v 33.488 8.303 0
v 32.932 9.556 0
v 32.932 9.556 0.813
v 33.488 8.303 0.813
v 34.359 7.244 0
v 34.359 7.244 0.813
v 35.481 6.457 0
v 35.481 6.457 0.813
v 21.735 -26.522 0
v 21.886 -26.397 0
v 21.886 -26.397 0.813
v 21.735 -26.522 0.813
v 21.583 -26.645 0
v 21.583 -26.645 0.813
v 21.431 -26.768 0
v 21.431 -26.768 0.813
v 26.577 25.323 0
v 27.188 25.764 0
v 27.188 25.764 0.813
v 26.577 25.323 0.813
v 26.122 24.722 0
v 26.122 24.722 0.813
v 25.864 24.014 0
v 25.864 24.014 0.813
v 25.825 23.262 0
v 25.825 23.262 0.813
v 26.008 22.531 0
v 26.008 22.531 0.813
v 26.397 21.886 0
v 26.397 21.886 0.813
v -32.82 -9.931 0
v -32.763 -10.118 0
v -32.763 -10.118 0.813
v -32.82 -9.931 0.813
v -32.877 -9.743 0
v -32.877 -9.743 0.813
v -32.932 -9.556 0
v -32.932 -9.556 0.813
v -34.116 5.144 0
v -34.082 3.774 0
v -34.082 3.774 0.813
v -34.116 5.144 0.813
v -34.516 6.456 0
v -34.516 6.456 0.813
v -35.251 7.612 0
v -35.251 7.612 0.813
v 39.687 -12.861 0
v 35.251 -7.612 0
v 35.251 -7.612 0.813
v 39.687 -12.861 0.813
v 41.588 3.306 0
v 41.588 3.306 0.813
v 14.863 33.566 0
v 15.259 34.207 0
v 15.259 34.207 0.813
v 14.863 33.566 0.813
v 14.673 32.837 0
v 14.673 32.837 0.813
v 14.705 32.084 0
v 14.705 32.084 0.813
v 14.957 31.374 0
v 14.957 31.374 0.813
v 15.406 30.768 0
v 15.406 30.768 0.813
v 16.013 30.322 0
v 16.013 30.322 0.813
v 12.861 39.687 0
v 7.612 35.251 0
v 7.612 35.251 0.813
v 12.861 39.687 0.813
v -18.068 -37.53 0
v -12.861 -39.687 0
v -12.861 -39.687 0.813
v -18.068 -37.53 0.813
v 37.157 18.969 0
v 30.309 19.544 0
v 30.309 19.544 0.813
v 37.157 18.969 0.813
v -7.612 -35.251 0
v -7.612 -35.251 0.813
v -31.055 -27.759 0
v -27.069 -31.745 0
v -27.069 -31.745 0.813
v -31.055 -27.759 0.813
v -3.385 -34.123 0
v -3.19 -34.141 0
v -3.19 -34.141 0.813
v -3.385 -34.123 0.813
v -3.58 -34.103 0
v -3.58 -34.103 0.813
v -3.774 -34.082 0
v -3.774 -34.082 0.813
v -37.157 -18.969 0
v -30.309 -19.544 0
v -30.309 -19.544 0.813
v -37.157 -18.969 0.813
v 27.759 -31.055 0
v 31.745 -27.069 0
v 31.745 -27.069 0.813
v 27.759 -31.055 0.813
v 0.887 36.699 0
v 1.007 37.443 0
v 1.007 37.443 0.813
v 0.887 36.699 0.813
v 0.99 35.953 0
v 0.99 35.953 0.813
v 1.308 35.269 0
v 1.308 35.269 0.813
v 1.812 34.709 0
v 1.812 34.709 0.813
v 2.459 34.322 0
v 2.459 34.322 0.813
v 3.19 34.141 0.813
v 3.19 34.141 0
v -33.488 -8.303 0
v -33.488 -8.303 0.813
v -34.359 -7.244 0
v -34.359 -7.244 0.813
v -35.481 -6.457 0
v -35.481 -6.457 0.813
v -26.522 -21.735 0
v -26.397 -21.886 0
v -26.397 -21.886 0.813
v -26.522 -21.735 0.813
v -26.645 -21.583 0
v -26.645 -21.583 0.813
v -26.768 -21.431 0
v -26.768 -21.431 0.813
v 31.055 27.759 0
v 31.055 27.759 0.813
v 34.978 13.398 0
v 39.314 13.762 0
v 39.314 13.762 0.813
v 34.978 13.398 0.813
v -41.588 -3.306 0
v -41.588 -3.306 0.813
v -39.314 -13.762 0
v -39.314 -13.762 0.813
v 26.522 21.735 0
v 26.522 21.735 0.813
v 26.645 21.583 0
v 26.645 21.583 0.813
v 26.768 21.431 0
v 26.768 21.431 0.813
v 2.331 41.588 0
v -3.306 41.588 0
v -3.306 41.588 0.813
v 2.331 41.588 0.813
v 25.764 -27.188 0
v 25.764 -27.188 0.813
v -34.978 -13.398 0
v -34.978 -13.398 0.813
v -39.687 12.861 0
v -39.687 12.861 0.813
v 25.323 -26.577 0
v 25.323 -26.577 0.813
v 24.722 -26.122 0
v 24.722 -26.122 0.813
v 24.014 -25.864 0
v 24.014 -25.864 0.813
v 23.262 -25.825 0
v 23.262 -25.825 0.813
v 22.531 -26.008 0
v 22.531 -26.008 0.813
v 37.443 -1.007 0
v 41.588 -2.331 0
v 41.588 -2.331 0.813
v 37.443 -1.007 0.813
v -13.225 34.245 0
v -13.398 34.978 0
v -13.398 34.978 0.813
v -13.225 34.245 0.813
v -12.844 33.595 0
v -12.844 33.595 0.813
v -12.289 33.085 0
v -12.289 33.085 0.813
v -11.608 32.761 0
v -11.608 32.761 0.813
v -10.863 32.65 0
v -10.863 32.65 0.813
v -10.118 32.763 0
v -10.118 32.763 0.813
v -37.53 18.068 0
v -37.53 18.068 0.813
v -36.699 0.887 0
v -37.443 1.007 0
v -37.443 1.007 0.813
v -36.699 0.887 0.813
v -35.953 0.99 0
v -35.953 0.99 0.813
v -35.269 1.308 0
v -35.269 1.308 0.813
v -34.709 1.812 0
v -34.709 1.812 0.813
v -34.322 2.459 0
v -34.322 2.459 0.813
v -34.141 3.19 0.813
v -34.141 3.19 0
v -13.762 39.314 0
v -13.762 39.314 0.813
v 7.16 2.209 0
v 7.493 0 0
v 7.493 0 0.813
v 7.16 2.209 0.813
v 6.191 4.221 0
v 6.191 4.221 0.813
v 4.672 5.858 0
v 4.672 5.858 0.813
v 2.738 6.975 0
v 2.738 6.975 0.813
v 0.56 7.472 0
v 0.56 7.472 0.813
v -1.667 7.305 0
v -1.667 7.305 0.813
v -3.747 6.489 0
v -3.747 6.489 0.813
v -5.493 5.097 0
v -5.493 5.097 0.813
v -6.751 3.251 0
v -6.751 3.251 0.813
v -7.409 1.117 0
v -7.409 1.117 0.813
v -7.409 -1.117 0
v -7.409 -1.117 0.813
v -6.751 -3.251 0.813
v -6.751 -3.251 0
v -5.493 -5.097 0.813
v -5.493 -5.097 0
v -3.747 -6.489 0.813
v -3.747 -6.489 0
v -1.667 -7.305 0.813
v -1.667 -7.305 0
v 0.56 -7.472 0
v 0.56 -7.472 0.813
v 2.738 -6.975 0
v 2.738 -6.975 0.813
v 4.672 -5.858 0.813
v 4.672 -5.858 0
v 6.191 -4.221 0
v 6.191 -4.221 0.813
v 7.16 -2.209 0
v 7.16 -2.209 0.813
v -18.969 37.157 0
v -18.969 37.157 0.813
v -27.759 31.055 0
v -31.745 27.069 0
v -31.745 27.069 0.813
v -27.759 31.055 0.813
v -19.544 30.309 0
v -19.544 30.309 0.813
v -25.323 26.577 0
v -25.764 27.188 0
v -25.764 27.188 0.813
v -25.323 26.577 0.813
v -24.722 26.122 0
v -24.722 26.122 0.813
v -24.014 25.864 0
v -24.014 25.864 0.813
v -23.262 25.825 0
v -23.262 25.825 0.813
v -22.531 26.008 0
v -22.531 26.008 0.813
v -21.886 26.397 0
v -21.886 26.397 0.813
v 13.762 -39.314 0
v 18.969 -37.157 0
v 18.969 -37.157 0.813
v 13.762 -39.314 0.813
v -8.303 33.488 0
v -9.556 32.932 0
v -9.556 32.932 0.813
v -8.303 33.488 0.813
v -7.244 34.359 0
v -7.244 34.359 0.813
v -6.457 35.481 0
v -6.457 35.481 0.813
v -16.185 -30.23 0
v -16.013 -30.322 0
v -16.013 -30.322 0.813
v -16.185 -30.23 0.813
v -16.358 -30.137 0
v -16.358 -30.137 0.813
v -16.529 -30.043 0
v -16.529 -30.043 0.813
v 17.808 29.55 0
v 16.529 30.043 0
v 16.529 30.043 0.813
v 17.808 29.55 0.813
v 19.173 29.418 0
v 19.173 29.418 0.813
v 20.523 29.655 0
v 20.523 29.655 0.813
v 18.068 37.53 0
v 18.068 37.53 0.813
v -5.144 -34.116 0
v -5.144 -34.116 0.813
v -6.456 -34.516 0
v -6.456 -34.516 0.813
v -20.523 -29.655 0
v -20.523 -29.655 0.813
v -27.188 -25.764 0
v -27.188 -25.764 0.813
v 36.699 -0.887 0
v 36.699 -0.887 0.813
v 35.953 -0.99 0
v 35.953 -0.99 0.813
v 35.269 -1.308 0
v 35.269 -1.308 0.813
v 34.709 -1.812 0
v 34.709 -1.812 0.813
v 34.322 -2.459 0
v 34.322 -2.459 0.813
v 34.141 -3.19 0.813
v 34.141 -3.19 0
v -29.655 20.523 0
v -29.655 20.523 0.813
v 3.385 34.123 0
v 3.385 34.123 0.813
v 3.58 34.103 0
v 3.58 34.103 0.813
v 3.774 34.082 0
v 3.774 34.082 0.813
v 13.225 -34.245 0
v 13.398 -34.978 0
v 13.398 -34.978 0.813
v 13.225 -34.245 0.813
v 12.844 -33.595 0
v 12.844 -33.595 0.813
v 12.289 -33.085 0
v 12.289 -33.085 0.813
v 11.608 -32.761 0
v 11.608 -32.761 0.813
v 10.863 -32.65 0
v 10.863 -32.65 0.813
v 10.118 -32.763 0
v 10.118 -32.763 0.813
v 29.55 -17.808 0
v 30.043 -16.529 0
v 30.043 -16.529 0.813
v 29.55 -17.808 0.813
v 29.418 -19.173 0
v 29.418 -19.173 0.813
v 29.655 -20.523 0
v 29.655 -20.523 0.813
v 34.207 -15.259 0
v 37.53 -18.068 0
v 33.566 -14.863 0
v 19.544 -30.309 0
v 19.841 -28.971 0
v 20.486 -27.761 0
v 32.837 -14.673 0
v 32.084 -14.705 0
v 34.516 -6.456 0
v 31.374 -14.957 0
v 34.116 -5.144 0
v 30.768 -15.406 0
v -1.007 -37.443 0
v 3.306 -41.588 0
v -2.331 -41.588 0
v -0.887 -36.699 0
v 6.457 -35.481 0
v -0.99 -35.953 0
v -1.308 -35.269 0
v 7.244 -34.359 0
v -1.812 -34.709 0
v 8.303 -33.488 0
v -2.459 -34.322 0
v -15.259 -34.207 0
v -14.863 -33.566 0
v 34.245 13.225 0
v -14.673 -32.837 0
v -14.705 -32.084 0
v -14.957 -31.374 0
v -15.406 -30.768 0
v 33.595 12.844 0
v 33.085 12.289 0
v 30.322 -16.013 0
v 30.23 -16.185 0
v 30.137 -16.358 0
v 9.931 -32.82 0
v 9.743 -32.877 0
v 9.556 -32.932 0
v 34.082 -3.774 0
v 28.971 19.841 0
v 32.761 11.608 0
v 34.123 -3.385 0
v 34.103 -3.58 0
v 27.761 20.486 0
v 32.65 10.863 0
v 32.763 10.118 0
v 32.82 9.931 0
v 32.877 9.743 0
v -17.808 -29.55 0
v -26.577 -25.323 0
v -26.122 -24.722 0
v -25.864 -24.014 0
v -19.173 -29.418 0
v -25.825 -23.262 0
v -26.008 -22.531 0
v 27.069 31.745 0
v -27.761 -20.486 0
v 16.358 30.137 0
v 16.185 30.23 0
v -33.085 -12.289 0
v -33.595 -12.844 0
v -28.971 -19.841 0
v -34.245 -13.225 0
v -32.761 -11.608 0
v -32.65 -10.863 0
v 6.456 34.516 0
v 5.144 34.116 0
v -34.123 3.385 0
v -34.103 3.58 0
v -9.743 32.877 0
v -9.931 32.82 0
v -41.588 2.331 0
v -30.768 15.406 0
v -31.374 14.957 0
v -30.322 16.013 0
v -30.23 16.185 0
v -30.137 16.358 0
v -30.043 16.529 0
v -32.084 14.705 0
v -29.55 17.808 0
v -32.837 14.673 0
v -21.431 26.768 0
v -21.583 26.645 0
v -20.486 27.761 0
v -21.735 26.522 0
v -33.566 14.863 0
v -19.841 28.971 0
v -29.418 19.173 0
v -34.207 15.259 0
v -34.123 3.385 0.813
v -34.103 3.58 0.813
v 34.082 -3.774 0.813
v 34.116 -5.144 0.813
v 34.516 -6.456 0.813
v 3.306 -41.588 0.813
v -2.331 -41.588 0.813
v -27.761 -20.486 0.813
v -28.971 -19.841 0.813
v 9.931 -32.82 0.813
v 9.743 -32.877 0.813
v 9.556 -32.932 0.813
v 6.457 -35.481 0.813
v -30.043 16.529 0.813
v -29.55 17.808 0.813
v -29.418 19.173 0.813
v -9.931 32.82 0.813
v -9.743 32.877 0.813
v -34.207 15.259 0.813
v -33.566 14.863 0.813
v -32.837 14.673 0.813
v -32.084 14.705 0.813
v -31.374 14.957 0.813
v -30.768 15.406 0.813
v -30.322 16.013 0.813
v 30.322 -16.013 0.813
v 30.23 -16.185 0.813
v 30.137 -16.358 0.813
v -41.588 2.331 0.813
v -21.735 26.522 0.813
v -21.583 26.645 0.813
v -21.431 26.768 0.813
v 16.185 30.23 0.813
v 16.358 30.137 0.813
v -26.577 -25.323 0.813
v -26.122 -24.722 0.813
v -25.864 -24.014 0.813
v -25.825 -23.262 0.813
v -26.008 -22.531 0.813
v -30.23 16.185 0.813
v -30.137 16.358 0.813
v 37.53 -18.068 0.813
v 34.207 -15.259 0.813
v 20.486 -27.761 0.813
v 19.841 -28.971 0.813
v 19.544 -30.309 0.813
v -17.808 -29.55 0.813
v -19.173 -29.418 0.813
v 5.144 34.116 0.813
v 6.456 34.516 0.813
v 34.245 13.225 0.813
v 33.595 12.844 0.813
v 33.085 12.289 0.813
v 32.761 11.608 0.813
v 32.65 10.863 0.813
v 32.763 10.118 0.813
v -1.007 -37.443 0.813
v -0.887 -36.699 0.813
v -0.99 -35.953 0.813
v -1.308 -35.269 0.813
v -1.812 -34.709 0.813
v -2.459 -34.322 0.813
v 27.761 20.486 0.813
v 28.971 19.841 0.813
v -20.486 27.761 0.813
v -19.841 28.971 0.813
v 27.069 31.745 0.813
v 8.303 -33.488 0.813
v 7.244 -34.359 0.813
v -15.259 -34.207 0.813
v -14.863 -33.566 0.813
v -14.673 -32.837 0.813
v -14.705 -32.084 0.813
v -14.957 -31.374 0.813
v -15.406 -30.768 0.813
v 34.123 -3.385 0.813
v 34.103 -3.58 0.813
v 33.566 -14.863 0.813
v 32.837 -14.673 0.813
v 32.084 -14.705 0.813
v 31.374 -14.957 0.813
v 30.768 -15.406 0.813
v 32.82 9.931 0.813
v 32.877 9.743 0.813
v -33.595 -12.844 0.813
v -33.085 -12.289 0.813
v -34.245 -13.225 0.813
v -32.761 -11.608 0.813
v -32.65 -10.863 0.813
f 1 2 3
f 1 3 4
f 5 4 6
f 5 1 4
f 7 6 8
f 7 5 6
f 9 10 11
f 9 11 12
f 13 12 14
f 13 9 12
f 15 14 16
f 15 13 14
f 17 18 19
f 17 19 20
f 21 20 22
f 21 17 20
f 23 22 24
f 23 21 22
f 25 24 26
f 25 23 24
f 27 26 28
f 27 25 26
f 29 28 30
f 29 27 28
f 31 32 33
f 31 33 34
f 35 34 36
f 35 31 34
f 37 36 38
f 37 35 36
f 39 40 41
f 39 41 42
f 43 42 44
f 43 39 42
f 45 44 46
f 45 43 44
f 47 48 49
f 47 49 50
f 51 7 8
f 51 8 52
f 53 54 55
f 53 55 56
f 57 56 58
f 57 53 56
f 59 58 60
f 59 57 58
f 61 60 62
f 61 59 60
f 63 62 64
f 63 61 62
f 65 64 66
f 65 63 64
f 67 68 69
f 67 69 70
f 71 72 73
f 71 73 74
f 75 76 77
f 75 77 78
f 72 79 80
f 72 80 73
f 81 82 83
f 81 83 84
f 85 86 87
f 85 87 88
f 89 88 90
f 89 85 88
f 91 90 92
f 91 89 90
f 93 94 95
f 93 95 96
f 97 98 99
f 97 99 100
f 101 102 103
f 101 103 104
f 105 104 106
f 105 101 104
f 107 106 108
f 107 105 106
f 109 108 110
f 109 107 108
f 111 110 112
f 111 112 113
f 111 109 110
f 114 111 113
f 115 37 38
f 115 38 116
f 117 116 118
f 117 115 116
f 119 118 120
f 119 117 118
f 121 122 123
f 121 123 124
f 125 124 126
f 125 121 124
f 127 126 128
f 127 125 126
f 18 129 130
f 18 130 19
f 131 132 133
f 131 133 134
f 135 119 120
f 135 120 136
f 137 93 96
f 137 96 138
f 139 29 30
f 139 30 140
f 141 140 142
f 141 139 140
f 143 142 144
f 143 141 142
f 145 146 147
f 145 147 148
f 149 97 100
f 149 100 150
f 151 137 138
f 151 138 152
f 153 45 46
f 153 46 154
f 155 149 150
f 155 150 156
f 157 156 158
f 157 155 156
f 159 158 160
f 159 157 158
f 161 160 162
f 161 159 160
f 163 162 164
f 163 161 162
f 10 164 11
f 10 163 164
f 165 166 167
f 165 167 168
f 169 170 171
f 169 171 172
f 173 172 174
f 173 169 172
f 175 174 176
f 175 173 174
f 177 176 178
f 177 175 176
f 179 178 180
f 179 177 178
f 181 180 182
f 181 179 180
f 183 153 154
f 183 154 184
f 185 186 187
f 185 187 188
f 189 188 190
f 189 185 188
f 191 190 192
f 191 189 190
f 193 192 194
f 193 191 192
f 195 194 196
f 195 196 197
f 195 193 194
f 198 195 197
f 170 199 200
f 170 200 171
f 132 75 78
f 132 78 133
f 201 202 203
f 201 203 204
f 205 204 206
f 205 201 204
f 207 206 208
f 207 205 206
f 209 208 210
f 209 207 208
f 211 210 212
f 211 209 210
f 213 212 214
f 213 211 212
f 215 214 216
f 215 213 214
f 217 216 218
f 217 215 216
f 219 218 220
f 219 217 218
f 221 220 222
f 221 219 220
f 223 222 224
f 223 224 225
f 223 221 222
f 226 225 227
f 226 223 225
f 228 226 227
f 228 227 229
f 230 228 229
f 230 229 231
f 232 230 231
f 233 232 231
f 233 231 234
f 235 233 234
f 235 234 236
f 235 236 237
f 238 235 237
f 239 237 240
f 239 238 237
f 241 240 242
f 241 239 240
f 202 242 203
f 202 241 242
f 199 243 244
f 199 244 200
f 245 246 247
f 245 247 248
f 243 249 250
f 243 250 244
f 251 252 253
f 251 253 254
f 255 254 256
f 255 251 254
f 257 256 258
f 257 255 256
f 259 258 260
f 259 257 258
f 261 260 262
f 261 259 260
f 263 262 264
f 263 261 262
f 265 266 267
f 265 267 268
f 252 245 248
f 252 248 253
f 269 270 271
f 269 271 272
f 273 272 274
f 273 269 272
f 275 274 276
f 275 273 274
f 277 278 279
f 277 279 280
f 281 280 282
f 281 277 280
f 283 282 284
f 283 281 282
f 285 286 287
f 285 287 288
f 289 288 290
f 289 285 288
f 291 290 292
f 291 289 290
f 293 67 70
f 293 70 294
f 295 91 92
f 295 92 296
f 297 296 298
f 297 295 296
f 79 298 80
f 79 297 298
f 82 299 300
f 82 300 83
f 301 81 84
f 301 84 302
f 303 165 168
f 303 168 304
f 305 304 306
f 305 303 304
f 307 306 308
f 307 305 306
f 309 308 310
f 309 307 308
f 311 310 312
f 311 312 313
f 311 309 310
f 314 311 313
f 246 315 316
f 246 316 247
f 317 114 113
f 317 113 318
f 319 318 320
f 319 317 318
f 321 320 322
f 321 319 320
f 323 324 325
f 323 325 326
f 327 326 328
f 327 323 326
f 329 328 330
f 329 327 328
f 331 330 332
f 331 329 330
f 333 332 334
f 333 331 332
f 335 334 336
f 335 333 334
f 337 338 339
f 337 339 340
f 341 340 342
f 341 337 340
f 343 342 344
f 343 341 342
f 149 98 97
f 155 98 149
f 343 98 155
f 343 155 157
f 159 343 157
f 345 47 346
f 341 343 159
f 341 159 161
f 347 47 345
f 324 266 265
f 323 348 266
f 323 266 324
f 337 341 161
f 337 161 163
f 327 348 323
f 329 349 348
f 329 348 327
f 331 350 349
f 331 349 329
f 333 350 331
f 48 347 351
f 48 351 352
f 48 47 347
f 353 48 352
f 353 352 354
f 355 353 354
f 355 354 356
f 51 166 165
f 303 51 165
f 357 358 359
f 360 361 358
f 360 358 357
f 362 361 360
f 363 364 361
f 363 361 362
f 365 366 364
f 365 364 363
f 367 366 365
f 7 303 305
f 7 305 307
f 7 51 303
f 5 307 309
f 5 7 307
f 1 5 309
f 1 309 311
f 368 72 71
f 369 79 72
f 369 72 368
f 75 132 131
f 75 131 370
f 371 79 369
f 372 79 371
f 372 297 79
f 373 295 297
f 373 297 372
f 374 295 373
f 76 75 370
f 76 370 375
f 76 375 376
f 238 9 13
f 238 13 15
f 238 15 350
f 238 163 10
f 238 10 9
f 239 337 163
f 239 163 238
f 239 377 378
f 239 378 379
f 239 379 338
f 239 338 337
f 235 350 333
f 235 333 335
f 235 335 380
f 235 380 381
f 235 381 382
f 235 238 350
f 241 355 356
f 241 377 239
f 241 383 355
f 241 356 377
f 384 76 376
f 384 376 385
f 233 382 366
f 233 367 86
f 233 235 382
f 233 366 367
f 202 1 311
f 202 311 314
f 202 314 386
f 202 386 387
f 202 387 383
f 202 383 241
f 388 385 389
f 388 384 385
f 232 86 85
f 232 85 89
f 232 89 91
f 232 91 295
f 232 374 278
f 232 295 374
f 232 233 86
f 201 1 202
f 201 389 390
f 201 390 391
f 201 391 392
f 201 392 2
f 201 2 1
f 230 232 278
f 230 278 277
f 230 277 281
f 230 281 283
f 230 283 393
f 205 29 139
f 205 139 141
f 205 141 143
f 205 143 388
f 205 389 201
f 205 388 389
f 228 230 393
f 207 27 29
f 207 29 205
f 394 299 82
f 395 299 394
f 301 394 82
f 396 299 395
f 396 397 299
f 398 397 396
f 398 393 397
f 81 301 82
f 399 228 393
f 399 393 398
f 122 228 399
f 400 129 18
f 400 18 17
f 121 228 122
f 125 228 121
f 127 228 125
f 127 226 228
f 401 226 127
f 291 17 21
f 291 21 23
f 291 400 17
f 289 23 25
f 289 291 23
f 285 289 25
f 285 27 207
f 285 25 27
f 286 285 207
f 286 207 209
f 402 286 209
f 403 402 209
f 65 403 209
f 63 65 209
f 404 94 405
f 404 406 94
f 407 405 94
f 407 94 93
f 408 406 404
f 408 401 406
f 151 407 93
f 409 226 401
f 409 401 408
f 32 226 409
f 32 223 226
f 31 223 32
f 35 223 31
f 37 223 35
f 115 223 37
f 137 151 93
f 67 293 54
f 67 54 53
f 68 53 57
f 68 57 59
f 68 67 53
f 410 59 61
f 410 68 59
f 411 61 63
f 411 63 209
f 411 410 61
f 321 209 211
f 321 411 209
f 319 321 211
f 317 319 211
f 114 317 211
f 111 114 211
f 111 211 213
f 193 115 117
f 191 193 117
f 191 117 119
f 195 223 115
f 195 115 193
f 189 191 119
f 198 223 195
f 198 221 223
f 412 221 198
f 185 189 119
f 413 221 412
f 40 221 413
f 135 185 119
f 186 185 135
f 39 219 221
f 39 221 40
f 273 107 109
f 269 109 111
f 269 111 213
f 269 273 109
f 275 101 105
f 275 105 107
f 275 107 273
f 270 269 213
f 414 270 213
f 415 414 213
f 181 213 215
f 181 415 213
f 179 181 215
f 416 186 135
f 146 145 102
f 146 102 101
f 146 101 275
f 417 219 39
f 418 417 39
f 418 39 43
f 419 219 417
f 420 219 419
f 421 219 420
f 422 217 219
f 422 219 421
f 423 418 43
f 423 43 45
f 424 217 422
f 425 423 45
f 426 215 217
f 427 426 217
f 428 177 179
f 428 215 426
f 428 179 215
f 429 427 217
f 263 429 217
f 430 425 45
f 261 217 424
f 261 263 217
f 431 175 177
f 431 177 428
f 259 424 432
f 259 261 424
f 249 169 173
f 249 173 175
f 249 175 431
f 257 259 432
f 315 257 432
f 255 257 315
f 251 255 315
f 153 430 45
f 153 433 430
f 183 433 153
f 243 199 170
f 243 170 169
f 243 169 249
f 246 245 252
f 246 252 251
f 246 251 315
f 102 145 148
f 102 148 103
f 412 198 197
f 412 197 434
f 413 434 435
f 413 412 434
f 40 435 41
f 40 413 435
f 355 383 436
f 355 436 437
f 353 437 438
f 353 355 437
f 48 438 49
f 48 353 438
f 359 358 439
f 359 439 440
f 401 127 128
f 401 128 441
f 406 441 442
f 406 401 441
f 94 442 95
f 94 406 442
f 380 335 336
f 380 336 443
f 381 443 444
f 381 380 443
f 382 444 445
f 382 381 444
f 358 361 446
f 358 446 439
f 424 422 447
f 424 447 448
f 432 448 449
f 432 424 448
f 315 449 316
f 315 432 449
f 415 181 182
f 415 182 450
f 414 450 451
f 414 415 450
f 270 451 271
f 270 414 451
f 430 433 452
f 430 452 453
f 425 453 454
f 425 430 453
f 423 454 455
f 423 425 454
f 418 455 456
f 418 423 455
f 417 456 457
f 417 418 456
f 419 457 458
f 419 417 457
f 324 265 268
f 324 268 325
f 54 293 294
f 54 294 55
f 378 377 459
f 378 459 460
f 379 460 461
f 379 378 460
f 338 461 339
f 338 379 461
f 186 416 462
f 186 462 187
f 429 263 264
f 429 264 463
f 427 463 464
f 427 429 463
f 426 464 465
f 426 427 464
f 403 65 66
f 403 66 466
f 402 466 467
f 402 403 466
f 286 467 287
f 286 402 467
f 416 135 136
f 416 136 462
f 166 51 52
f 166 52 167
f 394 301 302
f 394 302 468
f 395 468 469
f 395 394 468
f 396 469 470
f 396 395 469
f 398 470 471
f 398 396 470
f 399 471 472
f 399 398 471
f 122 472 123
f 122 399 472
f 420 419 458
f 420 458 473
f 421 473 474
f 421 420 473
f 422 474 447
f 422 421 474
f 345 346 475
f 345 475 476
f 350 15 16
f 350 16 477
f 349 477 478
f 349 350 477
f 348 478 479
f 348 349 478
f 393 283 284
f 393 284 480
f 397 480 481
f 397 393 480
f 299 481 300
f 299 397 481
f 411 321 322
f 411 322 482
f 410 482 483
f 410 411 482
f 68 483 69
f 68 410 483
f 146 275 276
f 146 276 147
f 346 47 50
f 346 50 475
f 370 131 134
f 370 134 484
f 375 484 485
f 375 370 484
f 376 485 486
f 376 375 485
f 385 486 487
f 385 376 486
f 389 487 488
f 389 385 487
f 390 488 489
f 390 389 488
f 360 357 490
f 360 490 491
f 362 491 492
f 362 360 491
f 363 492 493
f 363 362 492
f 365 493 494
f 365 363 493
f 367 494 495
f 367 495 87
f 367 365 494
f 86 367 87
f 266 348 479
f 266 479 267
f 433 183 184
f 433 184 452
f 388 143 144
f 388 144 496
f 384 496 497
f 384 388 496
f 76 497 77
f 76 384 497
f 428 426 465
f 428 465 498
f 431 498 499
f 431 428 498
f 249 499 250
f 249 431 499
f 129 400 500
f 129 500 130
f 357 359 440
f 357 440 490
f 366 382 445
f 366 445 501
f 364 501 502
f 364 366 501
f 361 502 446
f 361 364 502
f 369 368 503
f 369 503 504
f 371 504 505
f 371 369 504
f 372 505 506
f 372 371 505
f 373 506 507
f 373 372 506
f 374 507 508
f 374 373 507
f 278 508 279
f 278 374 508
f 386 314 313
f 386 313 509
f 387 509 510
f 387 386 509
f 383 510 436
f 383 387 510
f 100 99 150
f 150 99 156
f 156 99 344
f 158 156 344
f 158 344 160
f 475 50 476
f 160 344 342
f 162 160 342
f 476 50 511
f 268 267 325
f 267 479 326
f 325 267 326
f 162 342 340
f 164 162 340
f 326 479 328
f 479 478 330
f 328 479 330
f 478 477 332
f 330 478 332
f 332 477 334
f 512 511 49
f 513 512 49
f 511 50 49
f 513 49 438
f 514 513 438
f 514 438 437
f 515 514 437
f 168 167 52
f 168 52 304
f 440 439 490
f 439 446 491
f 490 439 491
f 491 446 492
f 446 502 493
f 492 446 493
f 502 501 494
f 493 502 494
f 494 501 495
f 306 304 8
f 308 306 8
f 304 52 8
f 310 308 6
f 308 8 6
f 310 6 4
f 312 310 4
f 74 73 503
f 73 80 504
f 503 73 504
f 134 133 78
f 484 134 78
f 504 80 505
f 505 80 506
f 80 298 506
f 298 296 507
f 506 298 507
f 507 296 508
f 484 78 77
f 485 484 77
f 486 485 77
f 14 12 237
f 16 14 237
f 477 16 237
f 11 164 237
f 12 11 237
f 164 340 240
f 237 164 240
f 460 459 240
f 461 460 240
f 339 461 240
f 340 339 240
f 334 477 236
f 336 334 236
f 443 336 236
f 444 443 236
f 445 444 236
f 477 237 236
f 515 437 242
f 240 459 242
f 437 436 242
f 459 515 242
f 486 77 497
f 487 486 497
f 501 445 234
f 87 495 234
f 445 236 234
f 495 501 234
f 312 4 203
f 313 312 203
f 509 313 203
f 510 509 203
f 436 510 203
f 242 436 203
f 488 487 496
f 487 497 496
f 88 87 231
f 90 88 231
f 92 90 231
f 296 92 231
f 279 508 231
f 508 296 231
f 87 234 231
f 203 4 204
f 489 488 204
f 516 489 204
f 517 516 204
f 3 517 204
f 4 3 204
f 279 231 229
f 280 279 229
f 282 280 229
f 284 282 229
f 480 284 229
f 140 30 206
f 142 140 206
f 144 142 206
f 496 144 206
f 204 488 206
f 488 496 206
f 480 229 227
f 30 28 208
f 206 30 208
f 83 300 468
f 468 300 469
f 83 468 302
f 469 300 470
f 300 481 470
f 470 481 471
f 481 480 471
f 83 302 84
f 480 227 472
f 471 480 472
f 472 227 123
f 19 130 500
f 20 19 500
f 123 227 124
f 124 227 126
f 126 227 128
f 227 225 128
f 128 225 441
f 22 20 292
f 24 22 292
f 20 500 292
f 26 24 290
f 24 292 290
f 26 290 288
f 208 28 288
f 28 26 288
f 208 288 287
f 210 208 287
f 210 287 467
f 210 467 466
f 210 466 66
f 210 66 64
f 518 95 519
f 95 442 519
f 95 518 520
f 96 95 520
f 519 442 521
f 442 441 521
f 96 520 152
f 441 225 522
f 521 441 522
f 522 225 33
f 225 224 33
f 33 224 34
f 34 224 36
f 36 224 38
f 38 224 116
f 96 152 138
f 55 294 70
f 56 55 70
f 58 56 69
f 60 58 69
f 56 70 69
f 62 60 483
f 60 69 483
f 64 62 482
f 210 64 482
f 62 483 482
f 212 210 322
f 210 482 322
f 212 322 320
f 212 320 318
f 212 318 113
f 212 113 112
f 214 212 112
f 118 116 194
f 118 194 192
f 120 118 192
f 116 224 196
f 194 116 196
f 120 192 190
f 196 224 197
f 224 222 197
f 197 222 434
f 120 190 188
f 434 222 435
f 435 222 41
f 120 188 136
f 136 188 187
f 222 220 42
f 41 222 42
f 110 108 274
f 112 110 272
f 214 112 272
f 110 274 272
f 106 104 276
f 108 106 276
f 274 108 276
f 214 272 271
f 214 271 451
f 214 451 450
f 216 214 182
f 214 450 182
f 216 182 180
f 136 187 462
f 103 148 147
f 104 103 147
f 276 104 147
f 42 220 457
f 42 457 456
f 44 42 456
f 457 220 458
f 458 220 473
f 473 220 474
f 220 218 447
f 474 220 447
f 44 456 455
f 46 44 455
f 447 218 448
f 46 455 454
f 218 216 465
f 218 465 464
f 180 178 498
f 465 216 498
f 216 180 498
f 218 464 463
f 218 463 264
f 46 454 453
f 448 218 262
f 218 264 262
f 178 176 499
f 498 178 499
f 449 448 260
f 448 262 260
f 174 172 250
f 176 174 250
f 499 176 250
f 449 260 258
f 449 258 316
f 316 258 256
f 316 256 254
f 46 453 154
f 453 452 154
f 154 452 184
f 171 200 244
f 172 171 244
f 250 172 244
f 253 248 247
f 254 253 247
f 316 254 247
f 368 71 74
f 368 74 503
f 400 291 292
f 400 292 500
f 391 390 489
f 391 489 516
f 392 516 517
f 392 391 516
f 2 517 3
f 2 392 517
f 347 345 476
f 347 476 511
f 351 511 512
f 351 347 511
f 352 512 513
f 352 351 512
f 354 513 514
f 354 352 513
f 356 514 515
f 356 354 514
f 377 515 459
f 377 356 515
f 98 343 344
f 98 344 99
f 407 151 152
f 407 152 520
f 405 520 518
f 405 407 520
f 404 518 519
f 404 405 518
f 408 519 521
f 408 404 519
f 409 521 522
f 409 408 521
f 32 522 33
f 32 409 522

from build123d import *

# Parameters (mm, degrees)
SKETCH1_R           = 7.493
BOSS_EXTRUDE1_DEPTH = 0.8128


with BuildPart() as part:
    # Sketch1 → Boss-Extrude1 (new body)
    with BuildSketch(Plane.XY):
        with BuildLine():
            Line((-6.457079781, 35.480882848), (-3.305892697, 41.587736724))
            Line((-3.305892697, 41.587736724), (2.330830076, 41.587736724))
            Line((2.330830076, 41.587736724), (1.007052256, 37.443040758))
            ThreePointArc((1.007052256, 37.443040758), (1.307937447, 35.269279401), (3.190317281, 34.141264998))
            ThreePointArc((3.190317281, 34.141264998), (3.482262993, 34.112724084), (3.773953868, 34.081686757))
            ThreePointArc((3.773953868, 34.081686757), (5.813520367, 34.271336714), (7.612382182, 35.251078913))
            Line((7.612382182, 35.251078913), (12.860691234, 39.687169127))
            Line((12.860691234, 39.687169127), (18.068344035, 37.530088709))
            Line((18.068344035, 37.530088709), (15.259226323, 34.207476777))
            ThreePointArc((15.259226323, 34.207476777), (14.705345535, 32.084039374), (16.012765313, 30.321534378))
            ThreePointArc((16.012765313, 30.321534378), (16.271565846, 30.183443225), (16.529175604, 30.043143208))
            ThreePointArc((16.529175604, 30.043143208), (18.486065244, 29.437848614), (20.522927965, 29.654617765))
            Line((20.522927965, 29.654617765), (27.069351508, 31.744589796))
            Line((27.069351508, 31.744589796), (31.055116405, 27.758824899))
            Line((31.055116405, 27.758824899), (27.188321507, 25.764134549))
            ThreePointArc((27.188321507, 25.764134549), (25.86399807, 24.014295194), (26.397414982, 21.885625015))
            ThreePointArc((26.397414982, 21.885625015), (26.583670301, 21.659006749), (26.767980192, 21.430803448))
            ThreePointArc((26.767980192, 21.430803448), (28.344274264, 20.122714917), (30.309044005, 19.543509881))
            Line((30.309044005, 19.543509881), (37.156948399, 18.969184434))
            Line((37.156948399, 18.969184434), (39.314028817, 13.761531633))
            Line((39.314028817, 13.761531633), (34.978241205, 13.398436388))
            ThreePointArc((34.978241205, 13.398436388), (33.085091357, 12.288592261), (32.763297513, 10.117827636))
            ThreePointArc((32.763297513, 10.117827636), (32.848651934, 9.837182834), (32.931602448, 9.555818134))
            ThreePointArc((32.931602448, 9.555818134), (33.88732447, 7.744080287), (35.480882848, 6.457079781))
            Line((35.480882848, 6.457079781), (41.587736724, 3.305892697))
            Line((41.587736724, 3.305892697), (41.587736724, -2.330830076))
            Line((41.587736724, -2.330830076), (37.443040758, -1.007052256))
            ThreePointArc((37.443040758, -1.007052256), (35.269279401, -1.307937447), (34.141264998, -3.190317281))
            ThreePointArc((34.141264998, -3.190317281), (34.112724084, -3.482262993), (34.081686757, -3.773953868))
            ThreePointArc((34.081686757, -3.773953868), (34.271336714, -5.813520367), (35.251078913, -7.612382182))
            Line((35.251078913, -7.612382182), (39.687169127, -12.860691234))
            Line((39.687169127, -12.860691234), (37.530088709, -18.068344035))
            Line((37.530088709, -18.068344035), (34.207476777, -15.259226323))
            ThreePointArc((34.207476777, -15.259226323), (32.084039374, -14.705345535), (30.321534378, -16.012765313))
            ThreePointArc((30.321534378, -16.012765313), (30.183443225, -16.271565846), (30.043143208, -16.529175604))
            ThreePointArc((30.043143208, -16.529175604), (29.437848614, -18.486065244), (29.654617765, -20.522927965))
            Line((29.654617765, -20.522927965), (31.744589796, -27.069351508))
            Line((31.744589796, -27.069351508), (27.758824899, -31.055116405))
            Line((27.758824899, -31.055116405), (25.764134549, -27.188321507))
            ThreePointArc((25.764134549, -27.188321507), (24.014295194, -25.86399807), (21.885625015, -26.397414982))
            ThreePointArc((21.885625015, -26.397414982), (21.659006749, -26.583670301), (21.430803448, -26.767980192))
            ThreePointArc((21.430803448, -26.767980192), (20.122714917, -28.344274264), (19.543509881, -30.309044005))
            Line((19.543509881, -30.309044005), (18.969184434, -37.156948399))
            Line((18.969184434, -37.156948399), (13.761531633, -39.314028817))
            Line((13.761531633, -39.314028817), (13.398436388, -34.978241205))
            ThreePointArc((13.398436388, -34.978241205), (12.288592261, -33.085091357), (10.117827636, -32.763297513))
            ThreePointArc((10.117827636, -32.763297513), (9.837182834, -32.848651934), (9.555818134, -32.931602448))
            ThreePointArc((9.555818134, -32.931602448), (7.744080287, -33.88732447), (6.457079781, -35.480882848))
            Line((6.457079781, -35.480882848), (3.305892697, -41.587736724))
            Line((3.305892697, -41.587736724), (-2.330830076, -41.587736724))
            Line((-2.330830076, -41.587736724), (-1.007052256, -37.443040758))
            ThreePointArc((-1.007052256, -37.443040758), (-1.307937447, -35.269279401), (-3.190317281, -34.141264998))
            ThreePointArc((-3.190317281, -34.141264998), (-3.482262993, -34.112724084), (-3.773953868, -34.081686757))
            ThreePointArc((-3.773953868, -34.081686757), (-5.813520367, -34.271336714), (-7.612382182, -35.251078913))
            Line((-7.612382182, -35.251078913), (-12.860691234, -39.687169127))
            Line((-12.860691234, -39.687169127), (-18.068344035, -37.530088709))
            Line((-18.068344035, -37.530088709), (-15.259226323, -34.207476777))
            ThreePointArc((-15.259226323, -34.207476777), (-14.705345535, -32.084039374), (-16.012765313, -30.321534378))
            ThreePointArc((-16.012765313, -30.321534378), (-16.271565846, -30.183443225), (-16.529175604, -30.043143208))
            ThreePointArc((-16.529175604, -30.043143208), (-18.486065244, -29.437848614), (-20.522927965, -29.654617765))
            Line((-20.522927965, -29.654617765), (-27.069351508, -31.744589796))
            Line((-27.069351508, -31.744589796), (-31.055116405, -27.758824899))
            Line((-31.055116405, -27.758824899), (-27.188321507, -25.764134549))
            ThreePointArc((-27.188321507, -25.764134549), (-25.86399807, -24.014295194), (-26.397414982, -21.885625015))
            ThreePointArc((-26.397414982, -21.885625015), (-26.583670301, -21.659006749), (-26.767980192, -21.430803448))
            ThreePointArc((-26.767980192, -21.430803448), (-28.344274264, -20.122714917), (-30.309044005, -19.543509881))
            Line((-30.309044005, -19.543509881), (-37.156948399, -18.969184434))
            Line((-37.156948399, -18.969184434), (-39.314028817, -13.761531633))
            Line((-39.314028817, -13.761531633), (-34.978241205, -13.398436388))
            ThreePointArc((-34.978241205, -13.398436388), (-33.085091357, -12.288592261), (-32.763297513, -10.117827636))
            ThreePointArc((-32.763297513, -10.117827636), (-32.848651934, -9.837182834), (-32.931602448, -9.555818134))
            ThreePointArc((-32.931602448, -9.555818134), (-33.88732447, -7.744080287), (-35.480882848, -6.457079781))
            Line((-35.480882848, -6.457079781), (-41.587736724, -3.305892697))
            Line((-41.587736724, -3.305892697), (-41.587736724, 2.330830076))
            Line((-41.587736724, 2.330830076), (-37.443040758, 1.007052256))
            ThreePointArc((-37.443040758, 1.007052256), (-35.269279401, 1.307937447), (-34.141264998, 3.190317281))
            ThreePointArc((-34.141264998, 3.190317281), (-34.112724084, 3.482262993), (-34.081686757, 3.773953868))
            ThreePointArc((-34.081686757, 3.773953868), (-34.271336714, 5.813520367), (-35.251078913, 7.612382182))
            Line((-35.251078913, 7.612382182), (-39.687169127, 12.860691234))
            Line((-39.687169127, 12.860691234), (-37.530088709, 18.068344035))
            Line((-37.530088709, 18.068344035), (-34.207476777, 15.259226323))
            ThreePointArc((-34.207476777, 15.259226323), (-32.084039374, 14.705345535), (-30.321534378, 16.012765313))
            ThreePointArc((-30.321534378, 16.012765313), (-30.183443225, 16.271565846), (-30.043143208, 16.529175604))
            ThreePointArc((-30.043143208, 16.529175604), (-29.437848614, 18.486065244), (-29.654617765, 20.522927965))
            Line((-29.654617765, 20.522927965), (-31.744589796, 27.069351508))
            Line((-31.744589796, 27.069351508), (-27.758824899, 31.055116405))
            Line((-27.758824899, 31.055116405), (-25.764134549, 27.188321507))
            ThreePointArc((-25.764134549, 27.188321507), (-24.014295194, 25.86399807), (-21.885625015, 26.397414982))
            ThreePointArc((-21.885625015, 26.397414982), (-21.659006749, 26.583670301), (-21.430803448, 26.767980192))
            ThreePointArc((-21.430803448, 26.767980192), (-20.122714917, 28.344274264), (-19.543509881, 30.309044005))
            Line((-19.543509881, 30.309044005), (-18.969184434, 37.156948399))
            Line((-18.969184434, 37.156948399), (-13.761531633, 39.314028817))
            Line((-13.761531633, 39.314028817), (-13.398436388, 34.978241205))
            ThreePointArc((-13.398436388, 34.978241205), (-12.288592261, 33.085091357), (-10.117827636, 32.763297513))
            ThreePointArc((-10.117827636, 32.763297513), (-9.837182834, 32.848651934), (-9.555818134, 32.931602448))
            ThreePointArc((-9.555818134, 32.931602448), (-7.744080287, 33.88732447), (-6.457079781, 35.480882848))
        make_face()
        Circle(SKETCH1_R, mode=Mode.SUBTRACT)
    extrude(amount=BOSS_EXTRUDE1_DEPTH)


solid = part.part
